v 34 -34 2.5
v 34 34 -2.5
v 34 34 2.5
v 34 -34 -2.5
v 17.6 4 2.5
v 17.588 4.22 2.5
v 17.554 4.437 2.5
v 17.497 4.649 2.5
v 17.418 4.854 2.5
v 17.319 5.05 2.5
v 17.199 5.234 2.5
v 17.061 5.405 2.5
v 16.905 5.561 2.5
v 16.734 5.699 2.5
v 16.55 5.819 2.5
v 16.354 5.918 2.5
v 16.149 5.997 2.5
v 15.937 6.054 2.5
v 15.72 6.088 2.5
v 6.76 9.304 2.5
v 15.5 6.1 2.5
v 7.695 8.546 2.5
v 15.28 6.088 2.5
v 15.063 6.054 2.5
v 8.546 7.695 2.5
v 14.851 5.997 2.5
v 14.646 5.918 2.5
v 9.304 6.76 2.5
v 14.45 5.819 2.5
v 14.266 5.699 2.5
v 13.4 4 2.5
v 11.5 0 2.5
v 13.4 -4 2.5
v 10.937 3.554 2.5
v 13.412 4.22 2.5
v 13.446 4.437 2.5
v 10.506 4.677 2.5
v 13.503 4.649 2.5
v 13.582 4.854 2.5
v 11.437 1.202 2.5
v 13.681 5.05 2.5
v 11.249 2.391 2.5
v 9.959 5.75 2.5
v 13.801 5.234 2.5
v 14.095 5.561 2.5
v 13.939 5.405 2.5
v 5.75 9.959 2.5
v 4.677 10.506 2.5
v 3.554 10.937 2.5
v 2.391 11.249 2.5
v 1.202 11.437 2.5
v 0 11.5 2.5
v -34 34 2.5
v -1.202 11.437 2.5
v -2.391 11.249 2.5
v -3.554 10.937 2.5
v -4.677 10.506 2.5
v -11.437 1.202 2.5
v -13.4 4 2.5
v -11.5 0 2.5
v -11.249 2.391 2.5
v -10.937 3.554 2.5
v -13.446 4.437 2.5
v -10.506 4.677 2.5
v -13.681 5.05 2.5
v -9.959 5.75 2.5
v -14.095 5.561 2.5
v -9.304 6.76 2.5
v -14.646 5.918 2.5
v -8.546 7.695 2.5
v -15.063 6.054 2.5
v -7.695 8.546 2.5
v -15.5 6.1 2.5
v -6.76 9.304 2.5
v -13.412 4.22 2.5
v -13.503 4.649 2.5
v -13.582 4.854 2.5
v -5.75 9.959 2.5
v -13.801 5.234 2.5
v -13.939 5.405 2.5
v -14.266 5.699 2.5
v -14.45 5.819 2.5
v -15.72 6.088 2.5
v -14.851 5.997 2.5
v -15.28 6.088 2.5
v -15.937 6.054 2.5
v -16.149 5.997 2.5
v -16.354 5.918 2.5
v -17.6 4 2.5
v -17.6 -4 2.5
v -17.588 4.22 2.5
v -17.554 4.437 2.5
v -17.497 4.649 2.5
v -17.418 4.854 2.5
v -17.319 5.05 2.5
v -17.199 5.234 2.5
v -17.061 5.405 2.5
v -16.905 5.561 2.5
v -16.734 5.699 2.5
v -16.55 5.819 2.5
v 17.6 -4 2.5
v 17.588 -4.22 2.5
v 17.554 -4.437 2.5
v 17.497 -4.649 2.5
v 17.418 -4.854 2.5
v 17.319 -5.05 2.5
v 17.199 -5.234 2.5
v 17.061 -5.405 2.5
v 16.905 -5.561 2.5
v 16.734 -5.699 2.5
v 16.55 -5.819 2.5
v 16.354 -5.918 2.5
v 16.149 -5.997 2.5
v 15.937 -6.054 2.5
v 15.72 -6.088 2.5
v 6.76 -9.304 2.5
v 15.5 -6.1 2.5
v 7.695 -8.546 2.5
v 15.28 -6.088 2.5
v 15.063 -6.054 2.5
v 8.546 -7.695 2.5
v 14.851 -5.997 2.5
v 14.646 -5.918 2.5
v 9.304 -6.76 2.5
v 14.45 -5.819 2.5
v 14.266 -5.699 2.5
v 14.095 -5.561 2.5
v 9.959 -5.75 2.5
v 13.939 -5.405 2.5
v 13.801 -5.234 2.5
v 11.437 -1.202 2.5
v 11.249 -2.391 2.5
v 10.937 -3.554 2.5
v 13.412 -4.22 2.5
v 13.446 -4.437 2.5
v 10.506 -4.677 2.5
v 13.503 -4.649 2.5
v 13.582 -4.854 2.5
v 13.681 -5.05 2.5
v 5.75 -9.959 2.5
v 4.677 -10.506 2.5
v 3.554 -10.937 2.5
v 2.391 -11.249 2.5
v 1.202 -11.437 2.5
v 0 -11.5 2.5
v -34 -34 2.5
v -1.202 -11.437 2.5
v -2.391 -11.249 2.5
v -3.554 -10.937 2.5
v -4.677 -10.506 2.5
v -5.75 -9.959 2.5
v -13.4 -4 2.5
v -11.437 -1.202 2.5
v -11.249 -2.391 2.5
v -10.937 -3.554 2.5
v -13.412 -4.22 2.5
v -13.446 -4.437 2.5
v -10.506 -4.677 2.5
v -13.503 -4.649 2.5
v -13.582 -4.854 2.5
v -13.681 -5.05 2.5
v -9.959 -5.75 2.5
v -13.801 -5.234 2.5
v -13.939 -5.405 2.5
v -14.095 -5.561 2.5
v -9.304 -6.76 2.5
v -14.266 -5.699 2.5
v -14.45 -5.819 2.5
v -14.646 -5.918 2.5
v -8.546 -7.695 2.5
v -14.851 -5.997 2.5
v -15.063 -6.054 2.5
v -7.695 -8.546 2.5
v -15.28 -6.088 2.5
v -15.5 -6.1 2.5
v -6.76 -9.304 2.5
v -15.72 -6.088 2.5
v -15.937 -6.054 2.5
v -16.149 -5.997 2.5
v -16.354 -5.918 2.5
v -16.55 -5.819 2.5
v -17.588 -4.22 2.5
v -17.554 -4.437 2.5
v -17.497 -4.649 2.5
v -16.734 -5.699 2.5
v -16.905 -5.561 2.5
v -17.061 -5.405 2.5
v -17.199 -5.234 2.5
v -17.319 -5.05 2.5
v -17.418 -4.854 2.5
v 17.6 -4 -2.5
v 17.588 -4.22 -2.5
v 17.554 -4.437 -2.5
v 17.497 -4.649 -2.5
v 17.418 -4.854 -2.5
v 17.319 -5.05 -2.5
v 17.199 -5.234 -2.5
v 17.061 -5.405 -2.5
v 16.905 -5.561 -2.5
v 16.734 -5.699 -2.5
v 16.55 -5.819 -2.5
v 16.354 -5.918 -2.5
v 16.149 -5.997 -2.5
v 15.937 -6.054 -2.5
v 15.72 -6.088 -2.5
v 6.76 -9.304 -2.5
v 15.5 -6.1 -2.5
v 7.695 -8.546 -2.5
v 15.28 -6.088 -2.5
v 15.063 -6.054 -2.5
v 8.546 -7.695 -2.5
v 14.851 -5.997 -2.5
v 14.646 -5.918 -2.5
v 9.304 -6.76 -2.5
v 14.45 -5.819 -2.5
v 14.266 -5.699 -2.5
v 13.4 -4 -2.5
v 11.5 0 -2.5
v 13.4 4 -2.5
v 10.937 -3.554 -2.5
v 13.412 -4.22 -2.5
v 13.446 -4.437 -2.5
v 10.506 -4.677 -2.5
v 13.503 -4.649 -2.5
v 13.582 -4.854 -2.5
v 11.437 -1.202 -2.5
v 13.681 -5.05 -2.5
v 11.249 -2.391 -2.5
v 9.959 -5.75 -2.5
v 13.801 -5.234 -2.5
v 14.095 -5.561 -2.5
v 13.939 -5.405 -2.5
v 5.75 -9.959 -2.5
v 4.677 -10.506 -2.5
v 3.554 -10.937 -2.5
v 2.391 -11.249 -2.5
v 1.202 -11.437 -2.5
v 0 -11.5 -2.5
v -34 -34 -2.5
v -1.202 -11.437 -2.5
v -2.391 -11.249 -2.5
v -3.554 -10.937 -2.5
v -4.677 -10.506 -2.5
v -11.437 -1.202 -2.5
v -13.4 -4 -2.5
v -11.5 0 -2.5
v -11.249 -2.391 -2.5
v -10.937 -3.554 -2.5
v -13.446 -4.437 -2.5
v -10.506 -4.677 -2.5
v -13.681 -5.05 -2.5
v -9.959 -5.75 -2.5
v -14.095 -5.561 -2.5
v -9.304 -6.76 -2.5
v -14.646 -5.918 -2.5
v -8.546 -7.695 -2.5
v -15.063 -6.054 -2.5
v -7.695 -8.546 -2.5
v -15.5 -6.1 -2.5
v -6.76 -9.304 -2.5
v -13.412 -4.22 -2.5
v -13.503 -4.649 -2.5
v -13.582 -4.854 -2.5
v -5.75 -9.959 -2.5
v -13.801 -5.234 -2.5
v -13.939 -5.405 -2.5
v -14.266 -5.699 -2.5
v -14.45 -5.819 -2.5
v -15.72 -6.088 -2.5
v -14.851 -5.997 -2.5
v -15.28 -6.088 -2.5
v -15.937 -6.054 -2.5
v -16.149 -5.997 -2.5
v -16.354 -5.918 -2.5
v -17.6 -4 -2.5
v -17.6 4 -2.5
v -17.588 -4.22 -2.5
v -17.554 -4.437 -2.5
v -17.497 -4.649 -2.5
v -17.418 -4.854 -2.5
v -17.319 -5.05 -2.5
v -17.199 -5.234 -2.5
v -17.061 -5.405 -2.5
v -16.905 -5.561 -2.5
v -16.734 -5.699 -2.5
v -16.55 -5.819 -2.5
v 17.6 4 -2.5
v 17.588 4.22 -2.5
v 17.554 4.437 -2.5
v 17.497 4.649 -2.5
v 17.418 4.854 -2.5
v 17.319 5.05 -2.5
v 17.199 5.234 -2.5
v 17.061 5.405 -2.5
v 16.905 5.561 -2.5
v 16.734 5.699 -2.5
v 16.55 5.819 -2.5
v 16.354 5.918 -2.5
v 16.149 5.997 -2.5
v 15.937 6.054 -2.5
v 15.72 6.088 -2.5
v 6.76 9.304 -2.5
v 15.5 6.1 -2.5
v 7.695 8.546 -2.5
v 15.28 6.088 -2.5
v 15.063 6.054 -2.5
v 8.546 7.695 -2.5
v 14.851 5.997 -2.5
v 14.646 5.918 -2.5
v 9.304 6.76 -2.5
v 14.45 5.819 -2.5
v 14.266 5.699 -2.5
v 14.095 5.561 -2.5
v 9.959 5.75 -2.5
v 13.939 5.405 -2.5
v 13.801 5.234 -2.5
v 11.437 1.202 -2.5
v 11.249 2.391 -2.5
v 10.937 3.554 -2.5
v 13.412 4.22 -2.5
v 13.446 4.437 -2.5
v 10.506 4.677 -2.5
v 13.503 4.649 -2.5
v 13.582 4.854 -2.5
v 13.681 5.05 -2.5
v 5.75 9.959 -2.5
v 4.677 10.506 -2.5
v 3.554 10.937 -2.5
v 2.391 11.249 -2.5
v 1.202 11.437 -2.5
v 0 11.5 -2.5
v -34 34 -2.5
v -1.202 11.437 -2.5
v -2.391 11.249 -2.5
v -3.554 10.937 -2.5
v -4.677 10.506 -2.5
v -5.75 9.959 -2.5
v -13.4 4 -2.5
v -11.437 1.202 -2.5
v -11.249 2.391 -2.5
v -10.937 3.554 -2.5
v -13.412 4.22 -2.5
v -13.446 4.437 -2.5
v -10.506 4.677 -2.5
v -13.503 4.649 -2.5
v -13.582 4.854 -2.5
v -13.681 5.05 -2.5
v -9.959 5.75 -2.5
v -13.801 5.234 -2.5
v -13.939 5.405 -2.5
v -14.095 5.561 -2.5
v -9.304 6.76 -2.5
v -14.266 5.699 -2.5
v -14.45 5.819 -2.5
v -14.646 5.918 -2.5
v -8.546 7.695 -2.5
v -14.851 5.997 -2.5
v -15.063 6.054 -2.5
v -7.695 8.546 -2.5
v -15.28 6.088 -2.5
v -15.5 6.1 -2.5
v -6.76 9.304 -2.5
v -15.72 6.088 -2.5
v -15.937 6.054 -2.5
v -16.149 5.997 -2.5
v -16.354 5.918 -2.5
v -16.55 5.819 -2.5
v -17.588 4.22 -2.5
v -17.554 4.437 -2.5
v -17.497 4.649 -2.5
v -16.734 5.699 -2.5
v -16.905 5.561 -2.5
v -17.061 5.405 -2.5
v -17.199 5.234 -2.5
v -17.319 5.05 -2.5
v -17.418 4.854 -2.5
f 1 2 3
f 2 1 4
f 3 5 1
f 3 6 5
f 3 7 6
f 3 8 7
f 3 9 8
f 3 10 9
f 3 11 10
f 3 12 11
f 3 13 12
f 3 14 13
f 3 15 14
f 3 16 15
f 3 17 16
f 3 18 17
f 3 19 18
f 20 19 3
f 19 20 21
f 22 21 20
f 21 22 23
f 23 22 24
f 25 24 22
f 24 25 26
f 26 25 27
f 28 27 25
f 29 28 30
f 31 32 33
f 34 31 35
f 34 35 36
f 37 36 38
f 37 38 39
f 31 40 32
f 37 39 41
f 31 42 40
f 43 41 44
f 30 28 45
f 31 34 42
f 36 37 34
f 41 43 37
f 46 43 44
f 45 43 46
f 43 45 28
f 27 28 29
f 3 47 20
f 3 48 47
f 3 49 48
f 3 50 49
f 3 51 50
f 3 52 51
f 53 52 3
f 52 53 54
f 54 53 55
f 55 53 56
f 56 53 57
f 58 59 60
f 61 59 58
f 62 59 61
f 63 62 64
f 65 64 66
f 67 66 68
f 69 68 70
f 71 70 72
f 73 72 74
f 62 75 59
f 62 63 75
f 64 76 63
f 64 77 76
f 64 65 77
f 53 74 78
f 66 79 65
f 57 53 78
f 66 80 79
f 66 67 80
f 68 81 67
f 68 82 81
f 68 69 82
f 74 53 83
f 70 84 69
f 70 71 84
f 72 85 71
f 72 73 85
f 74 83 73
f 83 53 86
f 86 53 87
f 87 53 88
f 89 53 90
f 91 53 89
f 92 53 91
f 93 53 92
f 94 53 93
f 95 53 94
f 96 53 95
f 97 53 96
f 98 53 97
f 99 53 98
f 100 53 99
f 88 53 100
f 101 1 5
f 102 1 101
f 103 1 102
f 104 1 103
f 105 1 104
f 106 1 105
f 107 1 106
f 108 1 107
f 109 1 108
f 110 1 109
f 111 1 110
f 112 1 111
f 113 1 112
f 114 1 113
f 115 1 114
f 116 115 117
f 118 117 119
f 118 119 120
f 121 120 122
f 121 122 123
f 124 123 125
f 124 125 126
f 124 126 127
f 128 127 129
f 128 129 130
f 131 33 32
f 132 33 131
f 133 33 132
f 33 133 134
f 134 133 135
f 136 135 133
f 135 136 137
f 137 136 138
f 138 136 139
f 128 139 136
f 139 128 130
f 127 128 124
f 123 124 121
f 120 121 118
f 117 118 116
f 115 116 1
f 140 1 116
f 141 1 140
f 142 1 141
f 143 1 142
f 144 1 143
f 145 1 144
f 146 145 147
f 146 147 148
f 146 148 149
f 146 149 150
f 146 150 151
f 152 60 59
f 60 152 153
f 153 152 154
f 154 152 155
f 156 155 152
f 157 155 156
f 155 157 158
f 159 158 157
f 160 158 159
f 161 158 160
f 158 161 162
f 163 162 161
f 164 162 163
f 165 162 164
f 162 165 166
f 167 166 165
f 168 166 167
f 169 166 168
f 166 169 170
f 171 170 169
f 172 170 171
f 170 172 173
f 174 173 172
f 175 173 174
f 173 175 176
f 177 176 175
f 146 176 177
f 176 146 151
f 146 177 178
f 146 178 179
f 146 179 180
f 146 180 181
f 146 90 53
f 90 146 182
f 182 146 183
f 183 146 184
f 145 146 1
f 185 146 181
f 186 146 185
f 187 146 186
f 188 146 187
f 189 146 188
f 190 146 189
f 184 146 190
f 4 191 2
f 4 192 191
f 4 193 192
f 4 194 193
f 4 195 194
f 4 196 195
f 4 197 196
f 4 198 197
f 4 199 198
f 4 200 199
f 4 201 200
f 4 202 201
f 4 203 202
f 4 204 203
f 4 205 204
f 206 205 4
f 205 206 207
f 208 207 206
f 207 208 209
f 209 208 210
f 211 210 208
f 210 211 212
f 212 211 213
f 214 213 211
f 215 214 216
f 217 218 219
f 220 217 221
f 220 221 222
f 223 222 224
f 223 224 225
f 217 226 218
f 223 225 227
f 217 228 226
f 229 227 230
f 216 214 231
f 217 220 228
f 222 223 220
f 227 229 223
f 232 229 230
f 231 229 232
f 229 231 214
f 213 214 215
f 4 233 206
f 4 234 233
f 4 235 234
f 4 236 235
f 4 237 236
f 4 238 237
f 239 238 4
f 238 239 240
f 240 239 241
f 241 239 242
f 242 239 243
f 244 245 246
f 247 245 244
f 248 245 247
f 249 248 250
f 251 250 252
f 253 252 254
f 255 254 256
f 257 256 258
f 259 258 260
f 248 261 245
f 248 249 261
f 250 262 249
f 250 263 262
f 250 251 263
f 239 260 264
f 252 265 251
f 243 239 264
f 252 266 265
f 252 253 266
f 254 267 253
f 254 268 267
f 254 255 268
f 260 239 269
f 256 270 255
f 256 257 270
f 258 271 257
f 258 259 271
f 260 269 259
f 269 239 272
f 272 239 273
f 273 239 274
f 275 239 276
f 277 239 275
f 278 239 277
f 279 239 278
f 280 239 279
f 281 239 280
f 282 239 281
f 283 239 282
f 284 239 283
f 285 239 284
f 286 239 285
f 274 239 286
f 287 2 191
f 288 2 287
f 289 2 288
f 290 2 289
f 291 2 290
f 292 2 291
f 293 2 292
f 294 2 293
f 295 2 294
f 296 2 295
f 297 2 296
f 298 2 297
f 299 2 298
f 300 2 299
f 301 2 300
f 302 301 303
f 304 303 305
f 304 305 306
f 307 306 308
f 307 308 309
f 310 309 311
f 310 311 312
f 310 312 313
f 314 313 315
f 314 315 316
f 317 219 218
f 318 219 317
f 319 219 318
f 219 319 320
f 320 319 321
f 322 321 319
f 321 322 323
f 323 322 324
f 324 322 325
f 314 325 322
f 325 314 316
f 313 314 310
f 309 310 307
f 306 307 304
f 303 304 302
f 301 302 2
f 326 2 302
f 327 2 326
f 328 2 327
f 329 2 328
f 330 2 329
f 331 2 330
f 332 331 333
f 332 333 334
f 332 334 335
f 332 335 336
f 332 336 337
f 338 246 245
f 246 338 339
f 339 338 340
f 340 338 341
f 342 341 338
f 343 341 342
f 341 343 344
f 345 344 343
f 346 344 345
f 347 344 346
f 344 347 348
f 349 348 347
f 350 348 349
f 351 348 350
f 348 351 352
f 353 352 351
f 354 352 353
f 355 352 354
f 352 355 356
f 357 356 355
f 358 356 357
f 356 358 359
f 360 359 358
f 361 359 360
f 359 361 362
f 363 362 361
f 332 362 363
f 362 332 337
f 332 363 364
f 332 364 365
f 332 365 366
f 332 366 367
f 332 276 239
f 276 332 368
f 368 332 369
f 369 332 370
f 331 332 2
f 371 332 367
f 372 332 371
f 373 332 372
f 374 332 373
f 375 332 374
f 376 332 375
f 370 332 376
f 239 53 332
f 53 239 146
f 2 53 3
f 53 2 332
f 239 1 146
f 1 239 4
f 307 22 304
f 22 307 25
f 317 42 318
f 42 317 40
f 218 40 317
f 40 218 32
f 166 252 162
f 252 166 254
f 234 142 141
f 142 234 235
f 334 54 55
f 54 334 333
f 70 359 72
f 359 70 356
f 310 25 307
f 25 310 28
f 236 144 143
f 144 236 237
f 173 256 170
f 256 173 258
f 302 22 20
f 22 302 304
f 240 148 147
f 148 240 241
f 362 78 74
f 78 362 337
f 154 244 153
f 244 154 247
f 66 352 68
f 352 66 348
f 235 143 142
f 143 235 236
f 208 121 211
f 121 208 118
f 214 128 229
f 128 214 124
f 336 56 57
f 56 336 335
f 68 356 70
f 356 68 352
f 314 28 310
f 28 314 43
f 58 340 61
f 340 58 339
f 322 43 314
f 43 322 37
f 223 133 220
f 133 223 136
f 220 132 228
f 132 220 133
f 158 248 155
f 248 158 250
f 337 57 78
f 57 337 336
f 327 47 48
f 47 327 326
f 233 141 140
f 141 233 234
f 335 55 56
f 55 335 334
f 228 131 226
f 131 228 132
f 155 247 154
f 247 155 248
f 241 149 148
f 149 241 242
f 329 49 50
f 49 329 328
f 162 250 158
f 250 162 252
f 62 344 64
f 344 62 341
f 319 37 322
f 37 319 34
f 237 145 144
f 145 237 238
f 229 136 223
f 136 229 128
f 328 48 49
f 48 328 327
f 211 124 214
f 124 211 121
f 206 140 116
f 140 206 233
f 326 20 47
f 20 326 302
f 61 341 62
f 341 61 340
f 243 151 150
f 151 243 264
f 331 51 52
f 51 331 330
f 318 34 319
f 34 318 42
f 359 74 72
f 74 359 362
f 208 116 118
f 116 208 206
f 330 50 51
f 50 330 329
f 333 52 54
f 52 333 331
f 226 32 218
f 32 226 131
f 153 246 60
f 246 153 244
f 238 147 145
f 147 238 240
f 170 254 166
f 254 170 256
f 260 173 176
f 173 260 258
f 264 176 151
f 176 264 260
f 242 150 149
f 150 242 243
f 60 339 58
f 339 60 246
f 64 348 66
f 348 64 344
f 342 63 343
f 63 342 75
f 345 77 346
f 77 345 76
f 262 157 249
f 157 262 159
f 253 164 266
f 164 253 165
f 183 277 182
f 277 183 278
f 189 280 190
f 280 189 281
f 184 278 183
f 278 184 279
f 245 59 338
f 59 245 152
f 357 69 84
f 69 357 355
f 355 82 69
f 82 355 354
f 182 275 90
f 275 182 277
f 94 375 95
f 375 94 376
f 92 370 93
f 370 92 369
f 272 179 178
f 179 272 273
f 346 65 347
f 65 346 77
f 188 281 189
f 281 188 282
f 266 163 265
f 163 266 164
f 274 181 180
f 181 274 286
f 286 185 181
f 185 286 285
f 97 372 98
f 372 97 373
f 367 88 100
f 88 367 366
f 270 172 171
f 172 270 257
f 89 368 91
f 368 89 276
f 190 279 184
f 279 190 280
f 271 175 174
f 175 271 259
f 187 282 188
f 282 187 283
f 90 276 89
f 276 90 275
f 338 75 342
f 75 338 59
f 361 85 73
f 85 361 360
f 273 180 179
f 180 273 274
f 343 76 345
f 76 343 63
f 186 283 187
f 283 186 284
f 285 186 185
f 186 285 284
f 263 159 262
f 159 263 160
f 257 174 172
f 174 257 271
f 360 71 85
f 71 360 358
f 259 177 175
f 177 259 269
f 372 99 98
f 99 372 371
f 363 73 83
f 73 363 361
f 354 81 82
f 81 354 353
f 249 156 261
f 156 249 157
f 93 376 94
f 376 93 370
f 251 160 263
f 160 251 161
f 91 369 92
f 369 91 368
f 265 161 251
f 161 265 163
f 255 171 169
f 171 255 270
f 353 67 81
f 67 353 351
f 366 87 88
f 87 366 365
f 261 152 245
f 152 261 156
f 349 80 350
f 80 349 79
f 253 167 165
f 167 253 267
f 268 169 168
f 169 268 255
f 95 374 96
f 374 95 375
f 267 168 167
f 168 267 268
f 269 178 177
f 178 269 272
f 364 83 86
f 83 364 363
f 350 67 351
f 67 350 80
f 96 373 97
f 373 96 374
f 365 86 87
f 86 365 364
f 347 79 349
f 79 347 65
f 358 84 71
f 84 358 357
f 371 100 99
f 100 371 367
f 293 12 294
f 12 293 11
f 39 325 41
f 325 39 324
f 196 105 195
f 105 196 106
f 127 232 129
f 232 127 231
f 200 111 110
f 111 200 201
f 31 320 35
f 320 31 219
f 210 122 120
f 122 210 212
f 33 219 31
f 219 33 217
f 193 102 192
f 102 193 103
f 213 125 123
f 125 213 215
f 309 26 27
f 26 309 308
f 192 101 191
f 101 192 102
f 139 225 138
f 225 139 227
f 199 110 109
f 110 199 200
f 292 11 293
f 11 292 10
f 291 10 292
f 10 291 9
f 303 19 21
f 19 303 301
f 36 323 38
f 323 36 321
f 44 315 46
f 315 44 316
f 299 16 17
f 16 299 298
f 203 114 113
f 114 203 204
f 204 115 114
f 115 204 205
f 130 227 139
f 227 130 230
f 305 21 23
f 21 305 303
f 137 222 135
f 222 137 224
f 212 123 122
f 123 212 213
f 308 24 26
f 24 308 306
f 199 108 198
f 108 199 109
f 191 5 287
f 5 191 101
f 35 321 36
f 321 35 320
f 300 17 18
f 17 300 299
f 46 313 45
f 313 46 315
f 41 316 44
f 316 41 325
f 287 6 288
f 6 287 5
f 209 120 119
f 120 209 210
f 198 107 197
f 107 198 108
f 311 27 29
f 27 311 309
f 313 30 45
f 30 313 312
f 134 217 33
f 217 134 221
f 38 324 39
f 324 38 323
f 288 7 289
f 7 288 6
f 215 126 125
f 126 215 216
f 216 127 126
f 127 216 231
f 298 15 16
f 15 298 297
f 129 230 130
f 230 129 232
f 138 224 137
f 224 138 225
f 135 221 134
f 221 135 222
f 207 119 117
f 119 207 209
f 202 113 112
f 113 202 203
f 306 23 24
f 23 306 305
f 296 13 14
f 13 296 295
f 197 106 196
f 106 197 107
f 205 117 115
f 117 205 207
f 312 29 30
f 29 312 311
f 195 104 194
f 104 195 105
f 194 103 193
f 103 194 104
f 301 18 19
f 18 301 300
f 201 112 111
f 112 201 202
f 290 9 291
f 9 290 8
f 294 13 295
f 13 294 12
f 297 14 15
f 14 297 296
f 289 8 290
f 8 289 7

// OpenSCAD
// NEMA 17 adjustable motor plate, 68 mm square.
$fn = 60;
eps = 0.02;
plate = 68;
plate_t = 5;
hole_pitch = 31;
center_d = 23;
slot_l = 8;
slot_d = 4.2;
module slot(x) {
    hull() {
        translate([x, -slot_l / 2, -plate_t / 2 - eps]) cylinder(d = slot_d, h = plate_t + 2 * eps);
        translate([x, slot_l / 2, -plate_t / 2 - eps]) cylinder(d = slot_d, h = plate_t + 2 * eps);
    }
}
difference() {
    cube([plate, plate, plate_t], center = true);
    translate([0, 0, -plate_t / 2 - eps]) cylinder(d = center_d, h = plate_t + 2 * eps);
    slot(-hole_pitch / 2);
    slot(hole_pitch / 2);
}
